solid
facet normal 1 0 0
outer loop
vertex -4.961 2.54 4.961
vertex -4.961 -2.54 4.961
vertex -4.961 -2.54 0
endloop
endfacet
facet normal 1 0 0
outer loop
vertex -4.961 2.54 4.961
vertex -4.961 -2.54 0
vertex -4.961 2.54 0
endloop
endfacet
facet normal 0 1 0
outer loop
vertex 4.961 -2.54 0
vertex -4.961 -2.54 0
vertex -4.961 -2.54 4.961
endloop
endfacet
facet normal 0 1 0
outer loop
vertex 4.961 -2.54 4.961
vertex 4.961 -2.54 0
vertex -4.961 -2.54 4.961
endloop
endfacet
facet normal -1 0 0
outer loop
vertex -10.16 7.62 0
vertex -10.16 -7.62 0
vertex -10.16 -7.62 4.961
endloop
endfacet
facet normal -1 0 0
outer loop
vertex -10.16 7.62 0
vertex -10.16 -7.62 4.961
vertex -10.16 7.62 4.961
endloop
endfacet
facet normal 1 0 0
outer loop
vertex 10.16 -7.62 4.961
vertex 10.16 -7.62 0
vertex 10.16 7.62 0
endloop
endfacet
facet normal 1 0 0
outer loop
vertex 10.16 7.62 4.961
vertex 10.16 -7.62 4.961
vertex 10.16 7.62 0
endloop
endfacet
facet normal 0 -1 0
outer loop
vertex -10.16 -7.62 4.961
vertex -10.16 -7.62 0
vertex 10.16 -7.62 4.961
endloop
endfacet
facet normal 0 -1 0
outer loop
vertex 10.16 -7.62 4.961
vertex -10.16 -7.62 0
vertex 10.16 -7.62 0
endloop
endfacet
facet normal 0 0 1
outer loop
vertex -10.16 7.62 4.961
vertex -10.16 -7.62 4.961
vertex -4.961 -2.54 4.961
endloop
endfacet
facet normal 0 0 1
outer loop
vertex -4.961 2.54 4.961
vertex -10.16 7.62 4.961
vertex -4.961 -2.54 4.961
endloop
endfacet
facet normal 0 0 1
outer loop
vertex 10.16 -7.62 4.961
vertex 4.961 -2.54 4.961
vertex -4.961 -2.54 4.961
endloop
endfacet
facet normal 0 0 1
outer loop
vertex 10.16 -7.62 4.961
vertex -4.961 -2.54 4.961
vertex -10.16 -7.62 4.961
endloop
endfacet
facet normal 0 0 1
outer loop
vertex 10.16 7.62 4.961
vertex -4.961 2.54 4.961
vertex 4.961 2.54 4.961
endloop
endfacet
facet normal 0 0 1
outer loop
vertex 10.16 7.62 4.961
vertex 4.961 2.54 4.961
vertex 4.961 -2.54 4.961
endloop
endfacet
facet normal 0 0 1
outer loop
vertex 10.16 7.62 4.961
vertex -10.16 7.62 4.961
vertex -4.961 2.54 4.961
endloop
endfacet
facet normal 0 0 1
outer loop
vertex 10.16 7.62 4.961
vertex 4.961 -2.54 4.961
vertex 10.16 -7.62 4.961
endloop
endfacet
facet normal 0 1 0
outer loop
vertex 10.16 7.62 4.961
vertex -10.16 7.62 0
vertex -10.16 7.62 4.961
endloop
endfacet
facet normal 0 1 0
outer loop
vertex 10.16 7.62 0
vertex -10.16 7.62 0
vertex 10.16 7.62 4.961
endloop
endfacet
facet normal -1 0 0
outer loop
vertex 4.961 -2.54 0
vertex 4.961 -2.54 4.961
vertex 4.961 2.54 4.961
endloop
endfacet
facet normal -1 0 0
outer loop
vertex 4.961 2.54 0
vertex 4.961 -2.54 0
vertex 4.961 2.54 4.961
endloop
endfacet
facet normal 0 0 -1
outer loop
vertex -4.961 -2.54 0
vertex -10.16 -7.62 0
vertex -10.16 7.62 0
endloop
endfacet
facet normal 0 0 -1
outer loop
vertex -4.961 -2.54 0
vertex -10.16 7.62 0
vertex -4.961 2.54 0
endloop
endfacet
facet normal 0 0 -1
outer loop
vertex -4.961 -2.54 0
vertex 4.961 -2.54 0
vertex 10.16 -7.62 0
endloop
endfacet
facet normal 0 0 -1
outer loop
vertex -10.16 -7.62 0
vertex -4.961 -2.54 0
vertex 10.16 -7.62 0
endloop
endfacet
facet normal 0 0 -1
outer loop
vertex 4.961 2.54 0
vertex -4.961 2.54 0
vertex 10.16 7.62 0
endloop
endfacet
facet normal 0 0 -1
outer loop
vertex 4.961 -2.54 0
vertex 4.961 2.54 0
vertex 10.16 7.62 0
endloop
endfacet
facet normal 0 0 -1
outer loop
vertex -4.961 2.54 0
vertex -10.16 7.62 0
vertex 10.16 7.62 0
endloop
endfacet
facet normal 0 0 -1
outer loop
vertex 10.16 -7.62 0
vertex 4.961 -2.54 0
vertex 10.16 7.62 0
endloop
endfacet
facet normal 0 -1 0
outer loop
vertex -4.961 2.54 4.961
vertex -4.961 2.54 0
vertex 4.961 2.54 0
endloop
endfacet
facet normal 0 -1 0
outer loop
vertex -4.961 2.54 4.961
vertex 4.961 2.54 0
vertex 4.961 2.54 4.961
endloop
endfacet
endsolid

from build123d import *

# Parameters (mm, degrees)
SKETCH1_W           = 20.32
SKETCH1_H           = 15.24
BOSS_EXTRUDE1_DEPTH = 4.9609375
CAVITY1_START       = -4.9609375
CAVITY1_OUTLINE_W   = 5.08
CAVITY1_OUTLINE_H   = 4.9609375
CAVITY1_DEPTH       = 9.921875


# Read off the part's stored shape, not the designer's step: Cavity1
with BuildPart() as part:
    # Sketch1 → Boss-Extrude1 (new body)
    with BuildSketch(Plane.XY):
        Rectangle(SKETCH1_W, SKETCH1_H)
    extrude(amount=BOSS_EXTRUDE1_DEPTH)

    # Cavity1 outline → Cavity1 (cut)
    with BuildSketch(Plane.YZ.offset(CAVITY1_START)):
        with Locations((0, 2.48046875)):
            Rectangle(CAVITY1_OUTLINE_W, CAVITY1_OUTLINE_H)
    extrude(amount=CAVITY1_DEPTH, mode=Mode.SUBTRACT)


solid = part.part
